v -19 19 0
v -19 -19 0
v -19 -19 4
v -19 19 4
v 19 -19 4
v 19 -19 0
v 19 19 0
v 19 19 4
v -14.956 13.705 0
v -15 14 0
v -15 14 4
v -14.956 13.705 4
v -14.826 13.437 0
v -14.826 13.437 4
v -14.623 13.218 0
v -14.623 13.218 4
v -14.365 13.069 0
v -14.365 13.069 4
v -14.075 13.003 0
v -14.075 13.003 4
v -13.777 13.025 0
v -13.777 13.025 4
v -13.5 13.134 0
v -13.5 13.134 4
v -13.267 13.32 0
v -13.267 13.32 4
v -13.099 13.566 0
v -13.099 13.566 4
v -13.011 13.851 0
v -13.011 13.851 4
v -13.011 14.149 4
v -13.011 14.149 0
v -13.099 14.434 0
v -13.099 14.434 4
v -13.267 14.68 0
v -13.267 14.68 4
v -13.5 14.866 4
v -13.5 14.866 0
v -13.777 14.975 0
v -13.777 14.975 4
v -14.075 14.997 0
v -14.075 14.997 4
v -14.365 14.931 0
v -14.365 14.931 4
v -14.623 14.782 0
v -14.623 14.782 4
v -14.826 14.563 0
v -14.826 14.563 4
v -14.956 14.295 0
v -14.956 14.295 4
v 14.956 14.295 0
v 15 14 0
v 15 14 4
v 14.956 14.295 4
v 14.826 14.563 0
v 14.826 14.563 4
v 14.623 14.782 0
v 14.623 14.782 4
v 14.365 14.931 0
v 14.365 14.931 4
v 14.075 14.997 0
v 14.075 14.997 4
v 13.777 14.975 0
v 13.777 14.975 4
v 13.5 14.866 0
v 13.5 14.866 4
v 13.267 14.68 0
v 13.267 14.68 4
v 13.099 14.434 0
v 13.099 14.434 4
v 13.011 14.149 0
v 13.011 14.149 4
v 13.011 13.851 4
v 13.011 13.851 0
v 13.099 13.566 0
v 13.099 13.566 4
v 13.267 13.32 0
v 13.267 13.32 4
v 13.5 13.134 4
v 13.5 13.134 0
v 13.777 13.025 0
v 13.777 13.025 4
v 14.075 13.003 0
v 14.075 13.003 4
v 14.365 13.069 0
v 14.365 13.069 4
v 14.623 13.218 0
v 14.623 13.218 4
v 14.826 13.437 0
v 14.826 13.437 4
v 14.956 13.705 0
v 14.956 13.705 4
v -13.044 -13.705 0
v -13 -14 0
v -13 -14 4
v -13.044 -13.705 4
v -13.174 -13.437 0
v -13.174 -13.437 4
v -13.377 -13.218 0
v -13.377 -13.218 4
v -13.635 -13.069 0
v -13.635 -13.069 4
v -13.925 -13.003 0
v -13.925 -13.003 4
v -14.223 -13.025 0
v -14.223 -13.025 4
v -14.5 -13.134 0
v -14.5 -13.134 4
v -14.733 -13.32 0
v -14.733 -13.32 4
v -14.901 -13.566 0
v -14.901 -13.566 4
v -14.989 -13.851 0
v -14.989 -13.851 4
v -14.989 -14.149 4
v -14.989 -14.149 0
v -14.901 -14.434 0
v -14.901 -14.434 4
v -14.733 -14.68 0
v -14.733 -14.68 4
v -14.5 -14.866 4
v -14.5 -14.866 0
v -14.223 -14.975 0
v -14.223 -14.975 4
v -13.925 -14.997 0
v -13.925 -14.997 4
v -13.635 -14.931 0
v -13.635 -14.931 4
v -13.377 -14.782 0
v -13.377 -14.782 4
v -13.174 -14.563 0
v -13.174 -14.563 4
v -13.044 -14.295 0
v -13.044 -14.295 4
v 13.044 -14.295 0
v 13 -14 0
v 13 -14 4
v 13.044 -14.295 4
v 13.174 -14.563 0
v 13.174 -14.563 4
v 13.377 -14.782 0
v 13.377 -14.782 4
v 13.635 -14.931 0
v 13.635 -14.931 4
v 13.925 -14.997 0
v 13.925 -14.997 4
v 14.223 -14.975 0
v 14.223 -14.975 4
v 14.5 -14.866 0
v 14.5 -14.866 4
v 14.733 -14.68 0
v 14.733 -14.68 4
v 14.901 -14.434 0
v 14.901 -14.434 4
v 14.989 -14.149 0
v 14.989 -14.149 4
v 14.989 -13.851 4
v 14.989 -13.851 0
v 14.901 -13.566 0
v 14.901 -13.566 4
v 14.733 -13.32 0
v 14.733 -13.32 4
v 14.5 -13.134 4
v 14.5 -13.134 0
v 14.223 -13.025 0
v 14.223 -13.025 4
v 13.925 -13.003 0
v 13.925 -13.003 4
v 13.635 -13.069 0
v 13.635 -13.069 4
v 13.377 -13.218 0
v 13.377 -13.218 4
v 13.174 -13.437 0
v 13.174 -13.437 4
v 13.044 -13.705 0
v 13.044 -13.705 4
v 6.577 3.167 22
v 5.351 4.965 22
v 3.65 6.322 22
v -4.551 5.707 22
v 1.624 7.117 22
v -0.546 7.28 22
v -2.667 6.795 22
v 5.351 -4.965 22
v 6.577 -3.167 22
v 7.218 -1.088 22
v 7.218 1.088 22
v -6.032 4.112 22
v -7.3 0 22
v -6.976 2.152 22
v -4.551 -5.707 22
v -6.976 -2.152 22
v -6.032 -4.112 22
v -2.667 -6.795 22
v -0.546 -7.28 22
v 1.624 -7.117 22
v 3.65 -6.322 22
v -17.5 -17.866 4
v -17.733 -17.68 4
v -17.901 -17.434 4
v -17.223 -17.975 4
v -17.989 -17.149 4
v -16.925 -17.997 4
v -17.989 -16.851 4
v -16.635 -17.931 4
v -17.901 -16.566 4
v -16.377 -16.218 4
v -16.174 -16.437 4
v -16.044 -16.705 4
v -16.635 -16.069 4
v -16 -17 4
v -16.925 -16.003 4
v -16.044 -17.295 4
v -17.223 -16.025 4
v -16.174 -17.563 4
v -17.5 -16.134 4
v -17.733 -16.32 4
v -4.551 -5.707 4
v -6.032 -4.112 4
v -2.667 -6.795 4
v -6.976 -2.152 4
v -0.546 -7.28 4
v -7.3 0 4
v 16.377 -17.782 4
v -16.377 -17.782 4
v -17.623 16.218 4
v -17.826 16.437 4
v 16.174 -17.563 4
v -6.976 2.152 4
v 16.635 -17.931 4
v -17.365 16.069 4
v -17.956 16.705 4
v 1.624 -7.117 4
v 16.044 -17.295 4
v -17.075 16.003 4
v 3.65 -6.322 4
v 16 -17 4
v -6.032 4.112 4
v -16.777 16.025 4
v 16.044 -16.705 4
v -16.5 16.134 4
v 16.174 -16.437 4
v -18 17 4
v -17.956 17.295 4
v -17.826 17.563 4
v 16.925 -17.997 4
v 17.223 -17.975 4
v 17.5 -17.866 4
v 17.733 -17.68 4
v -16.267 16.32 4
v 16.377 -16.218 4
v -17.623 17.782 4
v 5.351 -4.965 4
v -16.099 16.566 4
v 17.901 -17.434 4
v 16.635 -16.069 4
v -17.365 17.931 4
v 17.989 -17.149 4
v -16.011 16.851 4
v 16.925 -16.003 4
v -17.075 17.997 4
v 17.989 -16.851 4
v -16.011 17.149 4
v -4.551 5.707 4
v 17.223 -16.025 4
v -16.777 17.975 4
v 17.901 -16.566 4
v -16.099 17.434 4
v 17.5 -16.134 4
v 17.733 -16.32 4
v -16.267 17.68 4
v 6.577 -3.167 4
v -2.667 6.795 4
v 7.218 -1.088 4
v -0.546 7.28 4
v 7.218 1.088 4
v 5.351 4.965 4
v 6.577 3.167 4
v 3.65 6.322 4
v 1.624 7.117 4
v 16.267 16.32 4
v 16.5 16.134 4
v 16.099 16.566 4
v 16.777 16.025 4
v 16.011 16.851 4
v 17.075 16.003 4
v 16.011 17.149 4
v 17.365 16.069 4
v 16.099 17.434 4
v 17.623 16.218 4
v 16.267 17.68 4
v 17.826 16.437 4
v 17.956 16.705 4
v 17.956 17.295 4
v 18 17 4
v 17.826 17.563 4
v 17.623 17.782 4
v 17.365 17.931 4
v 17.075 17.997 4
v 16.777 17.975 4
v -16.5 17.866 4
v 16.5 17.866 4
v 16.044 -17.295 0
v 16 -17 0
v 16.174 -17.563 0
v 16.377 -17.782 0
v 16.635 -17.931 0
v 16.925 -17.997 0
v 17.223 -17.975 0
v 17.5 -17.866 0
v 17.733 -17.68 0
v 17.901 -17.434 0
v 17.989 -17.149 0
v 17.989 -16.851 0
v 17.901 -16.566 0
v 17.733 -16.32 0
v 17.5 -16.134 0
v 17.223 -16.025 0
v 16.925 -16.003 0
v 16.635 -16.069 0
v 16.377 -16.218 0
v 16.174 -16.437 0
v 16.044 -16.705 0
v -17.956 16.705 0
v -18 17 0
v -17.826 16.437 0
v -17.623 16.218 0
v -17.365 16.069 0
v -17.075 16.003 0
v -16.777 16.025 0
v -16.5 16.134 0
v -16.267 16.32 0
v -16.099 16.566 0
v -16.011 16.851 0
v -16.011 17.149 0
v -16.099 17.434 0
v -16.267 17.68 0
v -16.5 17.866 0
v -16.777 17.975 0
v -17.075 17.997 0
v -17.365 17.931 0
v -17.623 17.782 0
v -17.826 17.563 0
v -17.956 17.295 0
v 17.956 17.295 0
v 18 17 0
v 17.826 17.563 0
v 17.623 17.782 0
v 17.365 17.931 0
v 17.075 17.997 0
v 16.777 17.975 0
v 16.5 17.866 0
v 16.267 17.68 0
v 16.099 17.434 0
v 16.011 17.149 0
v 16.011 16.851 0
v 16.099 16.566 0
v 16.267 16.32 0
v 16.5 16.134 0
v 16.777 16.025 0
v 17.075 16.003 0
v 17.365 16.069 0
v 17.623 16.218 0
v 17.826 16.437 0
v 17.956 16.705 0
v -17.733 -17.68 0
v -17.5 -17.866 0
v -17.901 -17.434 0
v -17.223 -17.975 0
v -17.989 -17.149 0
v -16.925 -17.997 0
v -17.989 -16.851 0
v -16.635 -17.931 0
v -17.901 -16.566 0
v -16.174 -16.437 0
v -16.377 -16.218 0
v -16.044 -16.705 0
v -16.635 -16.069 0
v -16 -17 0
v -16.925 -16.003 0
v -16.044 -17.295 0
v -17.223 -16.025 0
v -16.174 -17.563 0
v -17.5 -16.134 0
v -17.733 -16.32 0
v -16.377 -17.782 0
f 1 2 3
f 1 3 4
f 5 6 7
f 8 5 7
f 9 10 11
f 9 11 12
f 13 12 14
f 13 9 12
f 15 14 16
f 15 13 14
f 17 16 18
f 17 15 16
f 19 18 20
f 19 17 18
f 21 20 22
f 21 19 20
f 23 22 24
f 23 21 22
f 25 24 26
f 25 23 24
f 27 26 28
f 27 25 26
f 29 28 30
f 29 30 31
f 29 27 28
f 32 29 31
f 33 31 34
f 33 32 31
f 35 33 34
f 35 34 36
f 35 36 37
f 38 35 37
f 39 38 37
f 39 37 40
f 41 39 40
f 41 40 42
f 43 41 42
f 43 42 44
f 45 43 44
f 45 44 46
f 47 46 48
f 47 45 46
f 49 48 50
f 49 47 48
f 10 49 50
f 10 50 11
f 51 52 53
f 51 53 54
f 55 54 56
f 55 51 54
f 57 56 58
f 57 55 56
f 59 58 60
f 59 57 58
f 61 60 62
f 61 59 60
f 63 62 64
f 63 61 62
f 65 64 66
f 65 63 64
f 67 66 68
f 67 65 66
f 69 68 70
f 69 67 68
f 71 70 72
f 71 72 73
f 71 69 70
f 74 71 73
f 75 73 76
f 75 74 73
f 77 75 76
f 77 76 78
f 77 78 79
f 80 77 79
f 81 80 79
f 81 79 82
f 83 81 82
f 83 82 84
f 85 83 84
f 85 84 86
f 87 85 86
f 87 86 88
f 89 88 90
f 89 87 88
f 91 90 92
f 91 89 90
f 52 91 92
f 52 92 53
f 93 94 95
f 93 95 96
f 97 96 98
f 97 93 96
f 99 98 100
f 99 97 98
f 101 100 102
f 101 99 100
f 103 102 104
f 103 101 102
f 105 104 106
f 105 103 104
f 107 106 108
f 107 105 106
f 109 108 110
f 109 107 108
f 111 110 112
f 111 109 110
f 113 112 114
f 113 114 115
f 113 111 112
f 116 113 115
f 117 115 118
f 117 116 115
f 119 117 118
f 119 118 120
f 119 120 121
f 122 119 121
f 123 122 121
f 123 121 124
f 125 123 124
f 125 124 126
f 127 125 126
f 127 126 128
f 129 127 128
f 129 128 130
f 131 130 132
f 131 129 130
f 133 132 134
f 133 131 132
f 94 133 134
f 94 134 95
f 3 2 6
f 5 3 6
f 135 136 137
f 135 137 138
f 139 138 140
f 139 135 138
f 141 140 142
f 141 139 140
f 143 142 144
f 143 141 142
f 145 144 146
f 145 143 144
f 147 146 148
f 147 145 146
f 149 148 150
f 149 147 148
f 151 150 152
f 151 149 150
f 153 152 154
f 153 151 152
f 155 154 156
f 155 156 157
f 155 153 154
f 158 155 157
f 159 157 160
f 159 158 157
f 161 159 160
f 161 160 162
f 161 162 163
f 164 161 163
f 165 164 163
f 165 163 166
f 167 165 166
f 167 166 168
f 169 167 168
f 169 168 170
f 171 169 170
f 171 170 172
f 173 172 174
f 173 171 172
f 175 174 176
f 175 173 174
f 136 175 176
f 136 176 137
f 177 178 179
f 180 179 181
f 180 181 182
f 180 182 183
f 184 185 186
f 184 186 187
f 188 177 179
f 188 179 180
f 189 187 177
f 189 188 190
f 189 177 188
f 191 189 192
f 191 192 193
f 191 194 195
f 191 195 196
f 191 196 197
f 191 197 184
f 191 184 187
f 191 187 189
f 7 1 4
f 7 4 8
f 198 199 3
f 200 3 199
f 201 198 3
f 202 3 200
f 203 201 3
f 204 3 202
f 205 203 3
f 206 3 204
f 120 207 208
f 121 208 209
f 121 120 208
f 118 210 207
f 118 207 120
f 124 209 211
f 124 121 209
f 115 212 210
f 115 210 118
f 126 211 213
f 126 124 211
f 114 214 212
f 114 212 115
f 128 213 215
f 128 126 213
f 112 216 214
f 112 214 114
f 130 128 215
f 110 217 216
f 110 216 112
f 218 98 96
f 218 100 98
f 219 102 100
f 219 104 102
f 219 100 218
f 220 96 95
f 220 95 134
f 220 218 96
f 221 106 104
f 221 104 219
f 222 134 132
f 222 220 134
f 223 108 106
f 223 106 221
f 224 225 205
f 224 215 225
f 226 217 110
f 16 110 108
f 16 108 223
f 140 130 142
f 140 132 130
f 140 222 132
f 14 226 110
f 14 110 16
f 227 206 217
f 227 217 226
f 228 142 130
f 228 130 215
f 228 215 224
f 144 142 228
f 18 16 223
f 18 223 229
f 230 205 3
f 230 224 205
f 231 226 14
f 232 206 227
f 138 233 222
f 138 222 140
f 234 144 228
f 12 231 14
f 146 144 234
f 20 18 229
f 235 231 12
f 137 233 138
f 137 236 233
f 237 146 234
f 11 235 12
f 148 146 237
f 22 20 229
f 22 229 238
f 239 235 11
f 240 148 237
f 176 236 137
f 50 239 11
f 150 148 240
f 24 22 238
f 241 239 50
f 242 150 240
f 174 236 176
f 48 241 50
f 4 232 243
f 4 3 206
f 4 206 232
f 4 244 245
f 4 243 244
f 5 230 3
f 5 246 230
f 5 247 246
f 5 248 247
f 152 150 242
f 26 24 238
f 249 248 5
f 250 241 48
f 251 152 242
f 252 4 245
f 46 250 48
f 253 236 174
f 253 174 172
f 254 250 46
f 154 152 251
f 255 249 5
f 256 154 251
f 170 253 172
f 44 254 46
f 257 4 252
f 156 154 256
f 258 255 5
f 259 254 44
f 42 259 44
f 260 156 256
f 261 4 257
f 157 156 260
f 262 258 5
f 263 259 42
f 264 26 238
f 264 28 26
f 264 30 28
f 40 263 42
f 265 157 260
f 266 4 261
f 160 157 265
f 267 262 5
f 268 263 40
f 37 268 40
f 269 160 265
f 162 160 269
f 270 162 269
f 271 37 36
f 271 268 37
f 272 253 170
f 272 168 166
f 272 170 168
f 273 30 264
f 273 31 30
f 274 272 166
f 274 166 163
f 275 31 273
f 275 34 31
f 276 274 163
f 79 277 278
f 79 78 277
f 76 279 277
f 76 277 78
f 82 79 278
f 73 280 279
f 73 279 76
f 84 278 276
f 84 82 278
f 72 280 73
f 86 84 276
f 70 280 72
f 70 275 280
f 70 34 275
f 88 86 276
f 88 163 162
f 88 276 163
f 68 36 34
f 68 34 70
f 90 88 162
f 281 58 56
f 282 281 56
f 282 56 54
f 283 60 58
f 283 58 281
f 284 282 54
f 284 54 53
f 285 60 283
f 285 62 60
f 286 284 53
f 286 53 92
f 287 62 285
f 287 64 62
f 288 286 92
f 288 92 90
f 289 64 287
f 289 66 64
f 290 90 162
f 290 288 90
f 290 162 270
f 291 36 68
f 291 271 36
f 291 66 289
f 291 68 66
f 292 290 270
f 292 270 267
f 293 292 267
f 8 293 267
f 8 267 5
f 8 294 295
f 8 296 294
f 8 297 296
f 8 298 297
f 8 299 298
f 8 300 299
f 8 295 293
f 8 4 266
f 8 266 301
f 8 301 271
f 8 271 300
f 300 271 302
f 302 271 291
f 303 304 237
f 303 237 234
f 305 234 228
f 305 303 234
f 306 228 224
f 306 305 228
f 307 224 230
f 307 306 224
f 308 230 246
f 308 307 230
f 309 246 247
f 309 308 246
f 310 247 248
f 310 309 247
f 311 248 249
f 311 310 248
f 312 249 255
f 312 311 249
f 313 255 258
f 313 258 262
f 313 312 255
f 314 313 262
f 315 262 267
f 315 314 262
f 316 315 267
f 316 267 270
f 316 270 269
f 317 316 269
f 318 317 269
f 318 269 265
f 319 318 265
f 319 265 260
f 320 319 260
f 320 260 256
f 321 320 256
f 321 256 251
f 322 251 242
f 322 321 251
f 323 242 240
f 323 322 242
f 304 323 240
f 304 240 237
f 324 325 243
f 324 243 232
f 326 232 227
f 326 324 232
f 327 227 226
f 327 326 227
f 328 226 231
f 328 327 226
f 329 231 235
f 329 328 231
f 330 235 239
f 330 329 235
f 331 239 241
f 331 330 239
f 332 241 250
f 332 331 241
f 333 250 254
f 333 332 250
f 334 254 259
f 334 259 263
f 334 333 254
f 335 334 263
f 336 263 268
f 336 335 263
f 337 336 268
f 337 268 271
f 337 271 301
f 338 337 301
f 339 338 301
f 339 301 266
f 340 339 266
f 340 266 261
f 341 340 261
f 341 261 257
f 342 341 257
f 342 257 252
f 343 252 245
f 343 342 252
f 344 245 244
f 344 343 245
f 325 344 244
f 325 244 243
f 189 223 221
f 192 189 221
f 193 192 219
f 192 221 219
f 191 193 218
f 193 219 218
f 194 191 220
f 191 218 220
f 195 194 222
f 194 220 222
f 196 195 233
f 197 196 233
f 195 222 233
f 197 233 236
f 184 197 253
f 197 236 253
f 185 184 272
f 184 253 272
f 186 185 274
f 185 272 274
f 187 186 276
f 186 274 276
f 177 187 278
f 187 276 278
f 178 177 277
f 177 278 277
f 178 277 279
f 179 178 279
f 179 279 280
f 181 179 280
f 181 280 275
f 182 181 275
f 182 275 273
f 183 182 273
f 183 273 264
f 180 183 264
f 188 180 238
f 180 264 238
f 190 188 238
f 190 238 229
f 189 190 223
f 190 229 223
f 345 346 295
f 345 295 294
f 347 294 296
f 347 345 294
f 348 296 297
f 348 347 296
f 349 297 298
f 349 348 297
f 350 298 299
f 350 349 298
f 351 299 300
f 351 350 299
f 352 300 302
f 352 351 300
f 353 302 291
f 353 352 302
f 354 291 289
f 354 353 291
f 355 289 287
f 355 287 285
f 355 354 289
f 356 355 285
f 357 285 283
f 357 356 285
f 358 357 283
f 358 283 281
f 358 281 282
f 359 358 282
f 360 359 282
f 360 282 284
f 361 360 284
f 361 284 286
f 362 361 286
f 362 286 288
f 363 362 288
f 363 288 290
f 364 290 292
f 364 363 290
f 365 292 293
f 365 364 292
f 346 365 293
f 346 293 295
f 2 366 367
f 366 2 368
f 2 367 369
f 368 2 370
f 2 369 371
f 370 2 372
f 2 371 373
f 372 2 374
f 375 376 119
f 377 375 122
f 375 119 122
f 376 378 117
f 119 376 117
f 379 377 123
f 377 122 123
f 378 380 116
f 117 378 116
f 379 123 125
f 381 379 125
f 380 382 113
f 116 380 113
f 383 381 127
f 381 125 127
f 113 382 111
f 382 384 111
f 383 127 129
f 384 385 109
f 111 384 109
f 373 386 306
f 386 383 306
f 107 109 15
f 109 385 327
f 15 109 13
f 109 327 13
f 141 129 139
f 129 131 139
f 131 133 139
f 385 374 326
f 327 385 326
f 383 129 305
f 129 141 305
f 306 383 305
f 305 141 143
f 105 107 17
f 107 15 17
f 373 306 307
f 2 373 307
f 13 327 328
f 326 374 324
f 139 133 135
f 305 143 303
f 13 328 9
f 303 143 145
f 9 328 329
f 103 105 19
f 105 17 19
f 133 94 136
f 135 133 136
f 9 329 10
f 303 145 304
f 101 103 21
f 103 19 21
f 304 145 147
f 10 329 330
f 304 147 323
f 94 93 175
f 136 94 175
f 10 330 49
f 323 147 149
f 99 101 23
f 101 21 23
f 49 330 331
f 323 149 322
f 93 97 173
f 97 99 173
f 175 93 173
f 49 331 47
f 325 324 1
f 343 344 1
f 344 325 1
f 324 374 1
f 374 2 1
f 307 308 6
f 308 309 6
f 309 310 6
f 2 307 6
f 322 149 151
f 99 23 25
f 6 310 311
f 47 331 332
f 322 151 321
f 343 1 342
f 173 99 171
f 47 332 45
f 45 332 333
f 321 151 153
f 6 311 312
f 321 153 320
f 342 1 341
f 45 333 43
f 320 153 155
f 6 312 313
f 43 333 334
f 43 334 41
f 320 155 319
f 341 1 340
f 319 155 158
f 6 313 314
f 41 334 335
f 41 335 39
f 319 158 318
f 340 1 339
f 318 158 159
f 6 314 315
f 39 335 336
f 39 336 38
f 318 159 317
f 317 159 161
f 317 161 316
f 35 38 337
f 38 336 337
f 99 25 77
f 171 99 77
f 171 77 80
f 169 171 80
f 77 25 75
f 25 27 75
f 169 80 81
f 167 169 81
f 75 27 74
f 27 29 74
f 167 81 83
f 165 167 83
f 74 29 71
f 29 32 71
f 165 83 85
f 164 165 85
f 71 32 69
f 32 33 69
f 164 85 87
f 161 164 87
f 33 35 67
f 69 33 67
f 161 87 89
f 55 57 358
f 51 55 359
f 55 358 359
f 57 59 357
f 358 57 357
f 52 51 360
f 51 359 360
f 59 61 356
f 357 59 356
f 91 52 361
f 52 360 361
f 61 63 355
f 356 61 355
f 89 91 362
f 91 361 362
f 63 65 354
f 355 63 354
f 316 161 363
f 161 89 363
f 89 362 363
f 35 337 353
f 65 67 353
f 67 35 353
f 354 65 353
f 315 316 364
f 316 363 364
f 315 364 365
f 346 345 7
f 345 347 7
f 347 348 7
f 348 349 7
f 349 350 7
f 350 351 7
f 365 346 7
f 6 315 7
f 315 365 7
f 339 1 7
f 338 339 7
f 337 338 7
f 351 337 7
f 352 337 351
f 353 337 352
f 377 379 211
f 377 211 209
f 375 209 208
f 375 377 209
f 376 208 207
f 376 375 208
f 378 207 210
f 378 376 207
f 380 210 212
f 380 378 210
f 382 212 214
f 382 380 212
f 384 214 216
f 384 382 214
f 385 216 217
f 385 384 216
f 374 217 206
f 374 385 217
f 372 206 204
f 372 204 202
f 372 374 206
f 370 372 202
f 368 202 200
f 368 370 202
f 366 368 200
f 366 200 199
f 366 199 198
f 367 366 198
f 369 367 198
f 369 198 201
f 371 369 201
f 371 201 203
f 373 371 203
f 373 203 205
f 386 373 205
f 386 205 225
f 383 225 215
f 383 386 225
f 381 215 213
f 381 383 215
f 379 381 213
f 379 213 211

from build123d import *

# Parameters (mm, degrees)
SKETCH1_W           = 38
SKETCH1_H           = 38
SKETCH1_R           = 1
BOSS_EXTRUDE1_DEPTH = 4
BOSS_EXTRUDE2_START = 4
SKETCH2_R           = 7.3
BOSS_EXTRUDE2_DEPTH = 18


with BuildPart() as part:
    # Sketch1 → Boss-Extrude1 (new body)
    with BuildSketch(Plane.XY):
        Rectangle(SKETCH1_W, SKETCH1_H)
        with Locations((14, 14)):
            Circle(SKETCH1_R, mode=Mode.SUBTRACT)
        with Locations((17, 17)):
            Circle(SKETCH1_R, mode=Mode.SUBTRACT)
        with Locations(Location((14, -14, 0), (0, 0, 180))):
            Circle(SKETCH1_R, mode=Mode.SUBTRACT)
        with Locations(Location((17, -17, 0), (0, 0, 180))):
            Circle(SKETCH1_R, mode=Mode.SUBTRACT)
        with Locations((-14, -14)):
            Circle(SKETCH1_R, mode=Mode.SUBTRACT)
        with Locations((-17, -17)):
            Circle(SKETCH1_R, mode=Mode.SUBTRACT)
        with Locations(Location((-17, 17, 0), (0, 0, 180))):
            Circle(SKETCH1_R, mode=Mode.SUBTRACT)
        with Locations(Location((-14, 14, 0), (0, 0, 180))):
            Circle(SKETCH1_R, mode=Mode.SUBTRACT)
    extrude(amount=BOSS_EXTRUDE1_DEPTH)

    # Sketch2 → Boss-Extrude2 (add)
    with BuildSketch(Plane.XY.offset(BOSS_EXTRUDE2_START)):
        with Locations(Location((0, 0, 0), (0, 0, 180))):
            Circle(SKETCH2_R)
    extrude(amount=BOSS_EXTRUDE2_DEPTH)


solid = part.part
